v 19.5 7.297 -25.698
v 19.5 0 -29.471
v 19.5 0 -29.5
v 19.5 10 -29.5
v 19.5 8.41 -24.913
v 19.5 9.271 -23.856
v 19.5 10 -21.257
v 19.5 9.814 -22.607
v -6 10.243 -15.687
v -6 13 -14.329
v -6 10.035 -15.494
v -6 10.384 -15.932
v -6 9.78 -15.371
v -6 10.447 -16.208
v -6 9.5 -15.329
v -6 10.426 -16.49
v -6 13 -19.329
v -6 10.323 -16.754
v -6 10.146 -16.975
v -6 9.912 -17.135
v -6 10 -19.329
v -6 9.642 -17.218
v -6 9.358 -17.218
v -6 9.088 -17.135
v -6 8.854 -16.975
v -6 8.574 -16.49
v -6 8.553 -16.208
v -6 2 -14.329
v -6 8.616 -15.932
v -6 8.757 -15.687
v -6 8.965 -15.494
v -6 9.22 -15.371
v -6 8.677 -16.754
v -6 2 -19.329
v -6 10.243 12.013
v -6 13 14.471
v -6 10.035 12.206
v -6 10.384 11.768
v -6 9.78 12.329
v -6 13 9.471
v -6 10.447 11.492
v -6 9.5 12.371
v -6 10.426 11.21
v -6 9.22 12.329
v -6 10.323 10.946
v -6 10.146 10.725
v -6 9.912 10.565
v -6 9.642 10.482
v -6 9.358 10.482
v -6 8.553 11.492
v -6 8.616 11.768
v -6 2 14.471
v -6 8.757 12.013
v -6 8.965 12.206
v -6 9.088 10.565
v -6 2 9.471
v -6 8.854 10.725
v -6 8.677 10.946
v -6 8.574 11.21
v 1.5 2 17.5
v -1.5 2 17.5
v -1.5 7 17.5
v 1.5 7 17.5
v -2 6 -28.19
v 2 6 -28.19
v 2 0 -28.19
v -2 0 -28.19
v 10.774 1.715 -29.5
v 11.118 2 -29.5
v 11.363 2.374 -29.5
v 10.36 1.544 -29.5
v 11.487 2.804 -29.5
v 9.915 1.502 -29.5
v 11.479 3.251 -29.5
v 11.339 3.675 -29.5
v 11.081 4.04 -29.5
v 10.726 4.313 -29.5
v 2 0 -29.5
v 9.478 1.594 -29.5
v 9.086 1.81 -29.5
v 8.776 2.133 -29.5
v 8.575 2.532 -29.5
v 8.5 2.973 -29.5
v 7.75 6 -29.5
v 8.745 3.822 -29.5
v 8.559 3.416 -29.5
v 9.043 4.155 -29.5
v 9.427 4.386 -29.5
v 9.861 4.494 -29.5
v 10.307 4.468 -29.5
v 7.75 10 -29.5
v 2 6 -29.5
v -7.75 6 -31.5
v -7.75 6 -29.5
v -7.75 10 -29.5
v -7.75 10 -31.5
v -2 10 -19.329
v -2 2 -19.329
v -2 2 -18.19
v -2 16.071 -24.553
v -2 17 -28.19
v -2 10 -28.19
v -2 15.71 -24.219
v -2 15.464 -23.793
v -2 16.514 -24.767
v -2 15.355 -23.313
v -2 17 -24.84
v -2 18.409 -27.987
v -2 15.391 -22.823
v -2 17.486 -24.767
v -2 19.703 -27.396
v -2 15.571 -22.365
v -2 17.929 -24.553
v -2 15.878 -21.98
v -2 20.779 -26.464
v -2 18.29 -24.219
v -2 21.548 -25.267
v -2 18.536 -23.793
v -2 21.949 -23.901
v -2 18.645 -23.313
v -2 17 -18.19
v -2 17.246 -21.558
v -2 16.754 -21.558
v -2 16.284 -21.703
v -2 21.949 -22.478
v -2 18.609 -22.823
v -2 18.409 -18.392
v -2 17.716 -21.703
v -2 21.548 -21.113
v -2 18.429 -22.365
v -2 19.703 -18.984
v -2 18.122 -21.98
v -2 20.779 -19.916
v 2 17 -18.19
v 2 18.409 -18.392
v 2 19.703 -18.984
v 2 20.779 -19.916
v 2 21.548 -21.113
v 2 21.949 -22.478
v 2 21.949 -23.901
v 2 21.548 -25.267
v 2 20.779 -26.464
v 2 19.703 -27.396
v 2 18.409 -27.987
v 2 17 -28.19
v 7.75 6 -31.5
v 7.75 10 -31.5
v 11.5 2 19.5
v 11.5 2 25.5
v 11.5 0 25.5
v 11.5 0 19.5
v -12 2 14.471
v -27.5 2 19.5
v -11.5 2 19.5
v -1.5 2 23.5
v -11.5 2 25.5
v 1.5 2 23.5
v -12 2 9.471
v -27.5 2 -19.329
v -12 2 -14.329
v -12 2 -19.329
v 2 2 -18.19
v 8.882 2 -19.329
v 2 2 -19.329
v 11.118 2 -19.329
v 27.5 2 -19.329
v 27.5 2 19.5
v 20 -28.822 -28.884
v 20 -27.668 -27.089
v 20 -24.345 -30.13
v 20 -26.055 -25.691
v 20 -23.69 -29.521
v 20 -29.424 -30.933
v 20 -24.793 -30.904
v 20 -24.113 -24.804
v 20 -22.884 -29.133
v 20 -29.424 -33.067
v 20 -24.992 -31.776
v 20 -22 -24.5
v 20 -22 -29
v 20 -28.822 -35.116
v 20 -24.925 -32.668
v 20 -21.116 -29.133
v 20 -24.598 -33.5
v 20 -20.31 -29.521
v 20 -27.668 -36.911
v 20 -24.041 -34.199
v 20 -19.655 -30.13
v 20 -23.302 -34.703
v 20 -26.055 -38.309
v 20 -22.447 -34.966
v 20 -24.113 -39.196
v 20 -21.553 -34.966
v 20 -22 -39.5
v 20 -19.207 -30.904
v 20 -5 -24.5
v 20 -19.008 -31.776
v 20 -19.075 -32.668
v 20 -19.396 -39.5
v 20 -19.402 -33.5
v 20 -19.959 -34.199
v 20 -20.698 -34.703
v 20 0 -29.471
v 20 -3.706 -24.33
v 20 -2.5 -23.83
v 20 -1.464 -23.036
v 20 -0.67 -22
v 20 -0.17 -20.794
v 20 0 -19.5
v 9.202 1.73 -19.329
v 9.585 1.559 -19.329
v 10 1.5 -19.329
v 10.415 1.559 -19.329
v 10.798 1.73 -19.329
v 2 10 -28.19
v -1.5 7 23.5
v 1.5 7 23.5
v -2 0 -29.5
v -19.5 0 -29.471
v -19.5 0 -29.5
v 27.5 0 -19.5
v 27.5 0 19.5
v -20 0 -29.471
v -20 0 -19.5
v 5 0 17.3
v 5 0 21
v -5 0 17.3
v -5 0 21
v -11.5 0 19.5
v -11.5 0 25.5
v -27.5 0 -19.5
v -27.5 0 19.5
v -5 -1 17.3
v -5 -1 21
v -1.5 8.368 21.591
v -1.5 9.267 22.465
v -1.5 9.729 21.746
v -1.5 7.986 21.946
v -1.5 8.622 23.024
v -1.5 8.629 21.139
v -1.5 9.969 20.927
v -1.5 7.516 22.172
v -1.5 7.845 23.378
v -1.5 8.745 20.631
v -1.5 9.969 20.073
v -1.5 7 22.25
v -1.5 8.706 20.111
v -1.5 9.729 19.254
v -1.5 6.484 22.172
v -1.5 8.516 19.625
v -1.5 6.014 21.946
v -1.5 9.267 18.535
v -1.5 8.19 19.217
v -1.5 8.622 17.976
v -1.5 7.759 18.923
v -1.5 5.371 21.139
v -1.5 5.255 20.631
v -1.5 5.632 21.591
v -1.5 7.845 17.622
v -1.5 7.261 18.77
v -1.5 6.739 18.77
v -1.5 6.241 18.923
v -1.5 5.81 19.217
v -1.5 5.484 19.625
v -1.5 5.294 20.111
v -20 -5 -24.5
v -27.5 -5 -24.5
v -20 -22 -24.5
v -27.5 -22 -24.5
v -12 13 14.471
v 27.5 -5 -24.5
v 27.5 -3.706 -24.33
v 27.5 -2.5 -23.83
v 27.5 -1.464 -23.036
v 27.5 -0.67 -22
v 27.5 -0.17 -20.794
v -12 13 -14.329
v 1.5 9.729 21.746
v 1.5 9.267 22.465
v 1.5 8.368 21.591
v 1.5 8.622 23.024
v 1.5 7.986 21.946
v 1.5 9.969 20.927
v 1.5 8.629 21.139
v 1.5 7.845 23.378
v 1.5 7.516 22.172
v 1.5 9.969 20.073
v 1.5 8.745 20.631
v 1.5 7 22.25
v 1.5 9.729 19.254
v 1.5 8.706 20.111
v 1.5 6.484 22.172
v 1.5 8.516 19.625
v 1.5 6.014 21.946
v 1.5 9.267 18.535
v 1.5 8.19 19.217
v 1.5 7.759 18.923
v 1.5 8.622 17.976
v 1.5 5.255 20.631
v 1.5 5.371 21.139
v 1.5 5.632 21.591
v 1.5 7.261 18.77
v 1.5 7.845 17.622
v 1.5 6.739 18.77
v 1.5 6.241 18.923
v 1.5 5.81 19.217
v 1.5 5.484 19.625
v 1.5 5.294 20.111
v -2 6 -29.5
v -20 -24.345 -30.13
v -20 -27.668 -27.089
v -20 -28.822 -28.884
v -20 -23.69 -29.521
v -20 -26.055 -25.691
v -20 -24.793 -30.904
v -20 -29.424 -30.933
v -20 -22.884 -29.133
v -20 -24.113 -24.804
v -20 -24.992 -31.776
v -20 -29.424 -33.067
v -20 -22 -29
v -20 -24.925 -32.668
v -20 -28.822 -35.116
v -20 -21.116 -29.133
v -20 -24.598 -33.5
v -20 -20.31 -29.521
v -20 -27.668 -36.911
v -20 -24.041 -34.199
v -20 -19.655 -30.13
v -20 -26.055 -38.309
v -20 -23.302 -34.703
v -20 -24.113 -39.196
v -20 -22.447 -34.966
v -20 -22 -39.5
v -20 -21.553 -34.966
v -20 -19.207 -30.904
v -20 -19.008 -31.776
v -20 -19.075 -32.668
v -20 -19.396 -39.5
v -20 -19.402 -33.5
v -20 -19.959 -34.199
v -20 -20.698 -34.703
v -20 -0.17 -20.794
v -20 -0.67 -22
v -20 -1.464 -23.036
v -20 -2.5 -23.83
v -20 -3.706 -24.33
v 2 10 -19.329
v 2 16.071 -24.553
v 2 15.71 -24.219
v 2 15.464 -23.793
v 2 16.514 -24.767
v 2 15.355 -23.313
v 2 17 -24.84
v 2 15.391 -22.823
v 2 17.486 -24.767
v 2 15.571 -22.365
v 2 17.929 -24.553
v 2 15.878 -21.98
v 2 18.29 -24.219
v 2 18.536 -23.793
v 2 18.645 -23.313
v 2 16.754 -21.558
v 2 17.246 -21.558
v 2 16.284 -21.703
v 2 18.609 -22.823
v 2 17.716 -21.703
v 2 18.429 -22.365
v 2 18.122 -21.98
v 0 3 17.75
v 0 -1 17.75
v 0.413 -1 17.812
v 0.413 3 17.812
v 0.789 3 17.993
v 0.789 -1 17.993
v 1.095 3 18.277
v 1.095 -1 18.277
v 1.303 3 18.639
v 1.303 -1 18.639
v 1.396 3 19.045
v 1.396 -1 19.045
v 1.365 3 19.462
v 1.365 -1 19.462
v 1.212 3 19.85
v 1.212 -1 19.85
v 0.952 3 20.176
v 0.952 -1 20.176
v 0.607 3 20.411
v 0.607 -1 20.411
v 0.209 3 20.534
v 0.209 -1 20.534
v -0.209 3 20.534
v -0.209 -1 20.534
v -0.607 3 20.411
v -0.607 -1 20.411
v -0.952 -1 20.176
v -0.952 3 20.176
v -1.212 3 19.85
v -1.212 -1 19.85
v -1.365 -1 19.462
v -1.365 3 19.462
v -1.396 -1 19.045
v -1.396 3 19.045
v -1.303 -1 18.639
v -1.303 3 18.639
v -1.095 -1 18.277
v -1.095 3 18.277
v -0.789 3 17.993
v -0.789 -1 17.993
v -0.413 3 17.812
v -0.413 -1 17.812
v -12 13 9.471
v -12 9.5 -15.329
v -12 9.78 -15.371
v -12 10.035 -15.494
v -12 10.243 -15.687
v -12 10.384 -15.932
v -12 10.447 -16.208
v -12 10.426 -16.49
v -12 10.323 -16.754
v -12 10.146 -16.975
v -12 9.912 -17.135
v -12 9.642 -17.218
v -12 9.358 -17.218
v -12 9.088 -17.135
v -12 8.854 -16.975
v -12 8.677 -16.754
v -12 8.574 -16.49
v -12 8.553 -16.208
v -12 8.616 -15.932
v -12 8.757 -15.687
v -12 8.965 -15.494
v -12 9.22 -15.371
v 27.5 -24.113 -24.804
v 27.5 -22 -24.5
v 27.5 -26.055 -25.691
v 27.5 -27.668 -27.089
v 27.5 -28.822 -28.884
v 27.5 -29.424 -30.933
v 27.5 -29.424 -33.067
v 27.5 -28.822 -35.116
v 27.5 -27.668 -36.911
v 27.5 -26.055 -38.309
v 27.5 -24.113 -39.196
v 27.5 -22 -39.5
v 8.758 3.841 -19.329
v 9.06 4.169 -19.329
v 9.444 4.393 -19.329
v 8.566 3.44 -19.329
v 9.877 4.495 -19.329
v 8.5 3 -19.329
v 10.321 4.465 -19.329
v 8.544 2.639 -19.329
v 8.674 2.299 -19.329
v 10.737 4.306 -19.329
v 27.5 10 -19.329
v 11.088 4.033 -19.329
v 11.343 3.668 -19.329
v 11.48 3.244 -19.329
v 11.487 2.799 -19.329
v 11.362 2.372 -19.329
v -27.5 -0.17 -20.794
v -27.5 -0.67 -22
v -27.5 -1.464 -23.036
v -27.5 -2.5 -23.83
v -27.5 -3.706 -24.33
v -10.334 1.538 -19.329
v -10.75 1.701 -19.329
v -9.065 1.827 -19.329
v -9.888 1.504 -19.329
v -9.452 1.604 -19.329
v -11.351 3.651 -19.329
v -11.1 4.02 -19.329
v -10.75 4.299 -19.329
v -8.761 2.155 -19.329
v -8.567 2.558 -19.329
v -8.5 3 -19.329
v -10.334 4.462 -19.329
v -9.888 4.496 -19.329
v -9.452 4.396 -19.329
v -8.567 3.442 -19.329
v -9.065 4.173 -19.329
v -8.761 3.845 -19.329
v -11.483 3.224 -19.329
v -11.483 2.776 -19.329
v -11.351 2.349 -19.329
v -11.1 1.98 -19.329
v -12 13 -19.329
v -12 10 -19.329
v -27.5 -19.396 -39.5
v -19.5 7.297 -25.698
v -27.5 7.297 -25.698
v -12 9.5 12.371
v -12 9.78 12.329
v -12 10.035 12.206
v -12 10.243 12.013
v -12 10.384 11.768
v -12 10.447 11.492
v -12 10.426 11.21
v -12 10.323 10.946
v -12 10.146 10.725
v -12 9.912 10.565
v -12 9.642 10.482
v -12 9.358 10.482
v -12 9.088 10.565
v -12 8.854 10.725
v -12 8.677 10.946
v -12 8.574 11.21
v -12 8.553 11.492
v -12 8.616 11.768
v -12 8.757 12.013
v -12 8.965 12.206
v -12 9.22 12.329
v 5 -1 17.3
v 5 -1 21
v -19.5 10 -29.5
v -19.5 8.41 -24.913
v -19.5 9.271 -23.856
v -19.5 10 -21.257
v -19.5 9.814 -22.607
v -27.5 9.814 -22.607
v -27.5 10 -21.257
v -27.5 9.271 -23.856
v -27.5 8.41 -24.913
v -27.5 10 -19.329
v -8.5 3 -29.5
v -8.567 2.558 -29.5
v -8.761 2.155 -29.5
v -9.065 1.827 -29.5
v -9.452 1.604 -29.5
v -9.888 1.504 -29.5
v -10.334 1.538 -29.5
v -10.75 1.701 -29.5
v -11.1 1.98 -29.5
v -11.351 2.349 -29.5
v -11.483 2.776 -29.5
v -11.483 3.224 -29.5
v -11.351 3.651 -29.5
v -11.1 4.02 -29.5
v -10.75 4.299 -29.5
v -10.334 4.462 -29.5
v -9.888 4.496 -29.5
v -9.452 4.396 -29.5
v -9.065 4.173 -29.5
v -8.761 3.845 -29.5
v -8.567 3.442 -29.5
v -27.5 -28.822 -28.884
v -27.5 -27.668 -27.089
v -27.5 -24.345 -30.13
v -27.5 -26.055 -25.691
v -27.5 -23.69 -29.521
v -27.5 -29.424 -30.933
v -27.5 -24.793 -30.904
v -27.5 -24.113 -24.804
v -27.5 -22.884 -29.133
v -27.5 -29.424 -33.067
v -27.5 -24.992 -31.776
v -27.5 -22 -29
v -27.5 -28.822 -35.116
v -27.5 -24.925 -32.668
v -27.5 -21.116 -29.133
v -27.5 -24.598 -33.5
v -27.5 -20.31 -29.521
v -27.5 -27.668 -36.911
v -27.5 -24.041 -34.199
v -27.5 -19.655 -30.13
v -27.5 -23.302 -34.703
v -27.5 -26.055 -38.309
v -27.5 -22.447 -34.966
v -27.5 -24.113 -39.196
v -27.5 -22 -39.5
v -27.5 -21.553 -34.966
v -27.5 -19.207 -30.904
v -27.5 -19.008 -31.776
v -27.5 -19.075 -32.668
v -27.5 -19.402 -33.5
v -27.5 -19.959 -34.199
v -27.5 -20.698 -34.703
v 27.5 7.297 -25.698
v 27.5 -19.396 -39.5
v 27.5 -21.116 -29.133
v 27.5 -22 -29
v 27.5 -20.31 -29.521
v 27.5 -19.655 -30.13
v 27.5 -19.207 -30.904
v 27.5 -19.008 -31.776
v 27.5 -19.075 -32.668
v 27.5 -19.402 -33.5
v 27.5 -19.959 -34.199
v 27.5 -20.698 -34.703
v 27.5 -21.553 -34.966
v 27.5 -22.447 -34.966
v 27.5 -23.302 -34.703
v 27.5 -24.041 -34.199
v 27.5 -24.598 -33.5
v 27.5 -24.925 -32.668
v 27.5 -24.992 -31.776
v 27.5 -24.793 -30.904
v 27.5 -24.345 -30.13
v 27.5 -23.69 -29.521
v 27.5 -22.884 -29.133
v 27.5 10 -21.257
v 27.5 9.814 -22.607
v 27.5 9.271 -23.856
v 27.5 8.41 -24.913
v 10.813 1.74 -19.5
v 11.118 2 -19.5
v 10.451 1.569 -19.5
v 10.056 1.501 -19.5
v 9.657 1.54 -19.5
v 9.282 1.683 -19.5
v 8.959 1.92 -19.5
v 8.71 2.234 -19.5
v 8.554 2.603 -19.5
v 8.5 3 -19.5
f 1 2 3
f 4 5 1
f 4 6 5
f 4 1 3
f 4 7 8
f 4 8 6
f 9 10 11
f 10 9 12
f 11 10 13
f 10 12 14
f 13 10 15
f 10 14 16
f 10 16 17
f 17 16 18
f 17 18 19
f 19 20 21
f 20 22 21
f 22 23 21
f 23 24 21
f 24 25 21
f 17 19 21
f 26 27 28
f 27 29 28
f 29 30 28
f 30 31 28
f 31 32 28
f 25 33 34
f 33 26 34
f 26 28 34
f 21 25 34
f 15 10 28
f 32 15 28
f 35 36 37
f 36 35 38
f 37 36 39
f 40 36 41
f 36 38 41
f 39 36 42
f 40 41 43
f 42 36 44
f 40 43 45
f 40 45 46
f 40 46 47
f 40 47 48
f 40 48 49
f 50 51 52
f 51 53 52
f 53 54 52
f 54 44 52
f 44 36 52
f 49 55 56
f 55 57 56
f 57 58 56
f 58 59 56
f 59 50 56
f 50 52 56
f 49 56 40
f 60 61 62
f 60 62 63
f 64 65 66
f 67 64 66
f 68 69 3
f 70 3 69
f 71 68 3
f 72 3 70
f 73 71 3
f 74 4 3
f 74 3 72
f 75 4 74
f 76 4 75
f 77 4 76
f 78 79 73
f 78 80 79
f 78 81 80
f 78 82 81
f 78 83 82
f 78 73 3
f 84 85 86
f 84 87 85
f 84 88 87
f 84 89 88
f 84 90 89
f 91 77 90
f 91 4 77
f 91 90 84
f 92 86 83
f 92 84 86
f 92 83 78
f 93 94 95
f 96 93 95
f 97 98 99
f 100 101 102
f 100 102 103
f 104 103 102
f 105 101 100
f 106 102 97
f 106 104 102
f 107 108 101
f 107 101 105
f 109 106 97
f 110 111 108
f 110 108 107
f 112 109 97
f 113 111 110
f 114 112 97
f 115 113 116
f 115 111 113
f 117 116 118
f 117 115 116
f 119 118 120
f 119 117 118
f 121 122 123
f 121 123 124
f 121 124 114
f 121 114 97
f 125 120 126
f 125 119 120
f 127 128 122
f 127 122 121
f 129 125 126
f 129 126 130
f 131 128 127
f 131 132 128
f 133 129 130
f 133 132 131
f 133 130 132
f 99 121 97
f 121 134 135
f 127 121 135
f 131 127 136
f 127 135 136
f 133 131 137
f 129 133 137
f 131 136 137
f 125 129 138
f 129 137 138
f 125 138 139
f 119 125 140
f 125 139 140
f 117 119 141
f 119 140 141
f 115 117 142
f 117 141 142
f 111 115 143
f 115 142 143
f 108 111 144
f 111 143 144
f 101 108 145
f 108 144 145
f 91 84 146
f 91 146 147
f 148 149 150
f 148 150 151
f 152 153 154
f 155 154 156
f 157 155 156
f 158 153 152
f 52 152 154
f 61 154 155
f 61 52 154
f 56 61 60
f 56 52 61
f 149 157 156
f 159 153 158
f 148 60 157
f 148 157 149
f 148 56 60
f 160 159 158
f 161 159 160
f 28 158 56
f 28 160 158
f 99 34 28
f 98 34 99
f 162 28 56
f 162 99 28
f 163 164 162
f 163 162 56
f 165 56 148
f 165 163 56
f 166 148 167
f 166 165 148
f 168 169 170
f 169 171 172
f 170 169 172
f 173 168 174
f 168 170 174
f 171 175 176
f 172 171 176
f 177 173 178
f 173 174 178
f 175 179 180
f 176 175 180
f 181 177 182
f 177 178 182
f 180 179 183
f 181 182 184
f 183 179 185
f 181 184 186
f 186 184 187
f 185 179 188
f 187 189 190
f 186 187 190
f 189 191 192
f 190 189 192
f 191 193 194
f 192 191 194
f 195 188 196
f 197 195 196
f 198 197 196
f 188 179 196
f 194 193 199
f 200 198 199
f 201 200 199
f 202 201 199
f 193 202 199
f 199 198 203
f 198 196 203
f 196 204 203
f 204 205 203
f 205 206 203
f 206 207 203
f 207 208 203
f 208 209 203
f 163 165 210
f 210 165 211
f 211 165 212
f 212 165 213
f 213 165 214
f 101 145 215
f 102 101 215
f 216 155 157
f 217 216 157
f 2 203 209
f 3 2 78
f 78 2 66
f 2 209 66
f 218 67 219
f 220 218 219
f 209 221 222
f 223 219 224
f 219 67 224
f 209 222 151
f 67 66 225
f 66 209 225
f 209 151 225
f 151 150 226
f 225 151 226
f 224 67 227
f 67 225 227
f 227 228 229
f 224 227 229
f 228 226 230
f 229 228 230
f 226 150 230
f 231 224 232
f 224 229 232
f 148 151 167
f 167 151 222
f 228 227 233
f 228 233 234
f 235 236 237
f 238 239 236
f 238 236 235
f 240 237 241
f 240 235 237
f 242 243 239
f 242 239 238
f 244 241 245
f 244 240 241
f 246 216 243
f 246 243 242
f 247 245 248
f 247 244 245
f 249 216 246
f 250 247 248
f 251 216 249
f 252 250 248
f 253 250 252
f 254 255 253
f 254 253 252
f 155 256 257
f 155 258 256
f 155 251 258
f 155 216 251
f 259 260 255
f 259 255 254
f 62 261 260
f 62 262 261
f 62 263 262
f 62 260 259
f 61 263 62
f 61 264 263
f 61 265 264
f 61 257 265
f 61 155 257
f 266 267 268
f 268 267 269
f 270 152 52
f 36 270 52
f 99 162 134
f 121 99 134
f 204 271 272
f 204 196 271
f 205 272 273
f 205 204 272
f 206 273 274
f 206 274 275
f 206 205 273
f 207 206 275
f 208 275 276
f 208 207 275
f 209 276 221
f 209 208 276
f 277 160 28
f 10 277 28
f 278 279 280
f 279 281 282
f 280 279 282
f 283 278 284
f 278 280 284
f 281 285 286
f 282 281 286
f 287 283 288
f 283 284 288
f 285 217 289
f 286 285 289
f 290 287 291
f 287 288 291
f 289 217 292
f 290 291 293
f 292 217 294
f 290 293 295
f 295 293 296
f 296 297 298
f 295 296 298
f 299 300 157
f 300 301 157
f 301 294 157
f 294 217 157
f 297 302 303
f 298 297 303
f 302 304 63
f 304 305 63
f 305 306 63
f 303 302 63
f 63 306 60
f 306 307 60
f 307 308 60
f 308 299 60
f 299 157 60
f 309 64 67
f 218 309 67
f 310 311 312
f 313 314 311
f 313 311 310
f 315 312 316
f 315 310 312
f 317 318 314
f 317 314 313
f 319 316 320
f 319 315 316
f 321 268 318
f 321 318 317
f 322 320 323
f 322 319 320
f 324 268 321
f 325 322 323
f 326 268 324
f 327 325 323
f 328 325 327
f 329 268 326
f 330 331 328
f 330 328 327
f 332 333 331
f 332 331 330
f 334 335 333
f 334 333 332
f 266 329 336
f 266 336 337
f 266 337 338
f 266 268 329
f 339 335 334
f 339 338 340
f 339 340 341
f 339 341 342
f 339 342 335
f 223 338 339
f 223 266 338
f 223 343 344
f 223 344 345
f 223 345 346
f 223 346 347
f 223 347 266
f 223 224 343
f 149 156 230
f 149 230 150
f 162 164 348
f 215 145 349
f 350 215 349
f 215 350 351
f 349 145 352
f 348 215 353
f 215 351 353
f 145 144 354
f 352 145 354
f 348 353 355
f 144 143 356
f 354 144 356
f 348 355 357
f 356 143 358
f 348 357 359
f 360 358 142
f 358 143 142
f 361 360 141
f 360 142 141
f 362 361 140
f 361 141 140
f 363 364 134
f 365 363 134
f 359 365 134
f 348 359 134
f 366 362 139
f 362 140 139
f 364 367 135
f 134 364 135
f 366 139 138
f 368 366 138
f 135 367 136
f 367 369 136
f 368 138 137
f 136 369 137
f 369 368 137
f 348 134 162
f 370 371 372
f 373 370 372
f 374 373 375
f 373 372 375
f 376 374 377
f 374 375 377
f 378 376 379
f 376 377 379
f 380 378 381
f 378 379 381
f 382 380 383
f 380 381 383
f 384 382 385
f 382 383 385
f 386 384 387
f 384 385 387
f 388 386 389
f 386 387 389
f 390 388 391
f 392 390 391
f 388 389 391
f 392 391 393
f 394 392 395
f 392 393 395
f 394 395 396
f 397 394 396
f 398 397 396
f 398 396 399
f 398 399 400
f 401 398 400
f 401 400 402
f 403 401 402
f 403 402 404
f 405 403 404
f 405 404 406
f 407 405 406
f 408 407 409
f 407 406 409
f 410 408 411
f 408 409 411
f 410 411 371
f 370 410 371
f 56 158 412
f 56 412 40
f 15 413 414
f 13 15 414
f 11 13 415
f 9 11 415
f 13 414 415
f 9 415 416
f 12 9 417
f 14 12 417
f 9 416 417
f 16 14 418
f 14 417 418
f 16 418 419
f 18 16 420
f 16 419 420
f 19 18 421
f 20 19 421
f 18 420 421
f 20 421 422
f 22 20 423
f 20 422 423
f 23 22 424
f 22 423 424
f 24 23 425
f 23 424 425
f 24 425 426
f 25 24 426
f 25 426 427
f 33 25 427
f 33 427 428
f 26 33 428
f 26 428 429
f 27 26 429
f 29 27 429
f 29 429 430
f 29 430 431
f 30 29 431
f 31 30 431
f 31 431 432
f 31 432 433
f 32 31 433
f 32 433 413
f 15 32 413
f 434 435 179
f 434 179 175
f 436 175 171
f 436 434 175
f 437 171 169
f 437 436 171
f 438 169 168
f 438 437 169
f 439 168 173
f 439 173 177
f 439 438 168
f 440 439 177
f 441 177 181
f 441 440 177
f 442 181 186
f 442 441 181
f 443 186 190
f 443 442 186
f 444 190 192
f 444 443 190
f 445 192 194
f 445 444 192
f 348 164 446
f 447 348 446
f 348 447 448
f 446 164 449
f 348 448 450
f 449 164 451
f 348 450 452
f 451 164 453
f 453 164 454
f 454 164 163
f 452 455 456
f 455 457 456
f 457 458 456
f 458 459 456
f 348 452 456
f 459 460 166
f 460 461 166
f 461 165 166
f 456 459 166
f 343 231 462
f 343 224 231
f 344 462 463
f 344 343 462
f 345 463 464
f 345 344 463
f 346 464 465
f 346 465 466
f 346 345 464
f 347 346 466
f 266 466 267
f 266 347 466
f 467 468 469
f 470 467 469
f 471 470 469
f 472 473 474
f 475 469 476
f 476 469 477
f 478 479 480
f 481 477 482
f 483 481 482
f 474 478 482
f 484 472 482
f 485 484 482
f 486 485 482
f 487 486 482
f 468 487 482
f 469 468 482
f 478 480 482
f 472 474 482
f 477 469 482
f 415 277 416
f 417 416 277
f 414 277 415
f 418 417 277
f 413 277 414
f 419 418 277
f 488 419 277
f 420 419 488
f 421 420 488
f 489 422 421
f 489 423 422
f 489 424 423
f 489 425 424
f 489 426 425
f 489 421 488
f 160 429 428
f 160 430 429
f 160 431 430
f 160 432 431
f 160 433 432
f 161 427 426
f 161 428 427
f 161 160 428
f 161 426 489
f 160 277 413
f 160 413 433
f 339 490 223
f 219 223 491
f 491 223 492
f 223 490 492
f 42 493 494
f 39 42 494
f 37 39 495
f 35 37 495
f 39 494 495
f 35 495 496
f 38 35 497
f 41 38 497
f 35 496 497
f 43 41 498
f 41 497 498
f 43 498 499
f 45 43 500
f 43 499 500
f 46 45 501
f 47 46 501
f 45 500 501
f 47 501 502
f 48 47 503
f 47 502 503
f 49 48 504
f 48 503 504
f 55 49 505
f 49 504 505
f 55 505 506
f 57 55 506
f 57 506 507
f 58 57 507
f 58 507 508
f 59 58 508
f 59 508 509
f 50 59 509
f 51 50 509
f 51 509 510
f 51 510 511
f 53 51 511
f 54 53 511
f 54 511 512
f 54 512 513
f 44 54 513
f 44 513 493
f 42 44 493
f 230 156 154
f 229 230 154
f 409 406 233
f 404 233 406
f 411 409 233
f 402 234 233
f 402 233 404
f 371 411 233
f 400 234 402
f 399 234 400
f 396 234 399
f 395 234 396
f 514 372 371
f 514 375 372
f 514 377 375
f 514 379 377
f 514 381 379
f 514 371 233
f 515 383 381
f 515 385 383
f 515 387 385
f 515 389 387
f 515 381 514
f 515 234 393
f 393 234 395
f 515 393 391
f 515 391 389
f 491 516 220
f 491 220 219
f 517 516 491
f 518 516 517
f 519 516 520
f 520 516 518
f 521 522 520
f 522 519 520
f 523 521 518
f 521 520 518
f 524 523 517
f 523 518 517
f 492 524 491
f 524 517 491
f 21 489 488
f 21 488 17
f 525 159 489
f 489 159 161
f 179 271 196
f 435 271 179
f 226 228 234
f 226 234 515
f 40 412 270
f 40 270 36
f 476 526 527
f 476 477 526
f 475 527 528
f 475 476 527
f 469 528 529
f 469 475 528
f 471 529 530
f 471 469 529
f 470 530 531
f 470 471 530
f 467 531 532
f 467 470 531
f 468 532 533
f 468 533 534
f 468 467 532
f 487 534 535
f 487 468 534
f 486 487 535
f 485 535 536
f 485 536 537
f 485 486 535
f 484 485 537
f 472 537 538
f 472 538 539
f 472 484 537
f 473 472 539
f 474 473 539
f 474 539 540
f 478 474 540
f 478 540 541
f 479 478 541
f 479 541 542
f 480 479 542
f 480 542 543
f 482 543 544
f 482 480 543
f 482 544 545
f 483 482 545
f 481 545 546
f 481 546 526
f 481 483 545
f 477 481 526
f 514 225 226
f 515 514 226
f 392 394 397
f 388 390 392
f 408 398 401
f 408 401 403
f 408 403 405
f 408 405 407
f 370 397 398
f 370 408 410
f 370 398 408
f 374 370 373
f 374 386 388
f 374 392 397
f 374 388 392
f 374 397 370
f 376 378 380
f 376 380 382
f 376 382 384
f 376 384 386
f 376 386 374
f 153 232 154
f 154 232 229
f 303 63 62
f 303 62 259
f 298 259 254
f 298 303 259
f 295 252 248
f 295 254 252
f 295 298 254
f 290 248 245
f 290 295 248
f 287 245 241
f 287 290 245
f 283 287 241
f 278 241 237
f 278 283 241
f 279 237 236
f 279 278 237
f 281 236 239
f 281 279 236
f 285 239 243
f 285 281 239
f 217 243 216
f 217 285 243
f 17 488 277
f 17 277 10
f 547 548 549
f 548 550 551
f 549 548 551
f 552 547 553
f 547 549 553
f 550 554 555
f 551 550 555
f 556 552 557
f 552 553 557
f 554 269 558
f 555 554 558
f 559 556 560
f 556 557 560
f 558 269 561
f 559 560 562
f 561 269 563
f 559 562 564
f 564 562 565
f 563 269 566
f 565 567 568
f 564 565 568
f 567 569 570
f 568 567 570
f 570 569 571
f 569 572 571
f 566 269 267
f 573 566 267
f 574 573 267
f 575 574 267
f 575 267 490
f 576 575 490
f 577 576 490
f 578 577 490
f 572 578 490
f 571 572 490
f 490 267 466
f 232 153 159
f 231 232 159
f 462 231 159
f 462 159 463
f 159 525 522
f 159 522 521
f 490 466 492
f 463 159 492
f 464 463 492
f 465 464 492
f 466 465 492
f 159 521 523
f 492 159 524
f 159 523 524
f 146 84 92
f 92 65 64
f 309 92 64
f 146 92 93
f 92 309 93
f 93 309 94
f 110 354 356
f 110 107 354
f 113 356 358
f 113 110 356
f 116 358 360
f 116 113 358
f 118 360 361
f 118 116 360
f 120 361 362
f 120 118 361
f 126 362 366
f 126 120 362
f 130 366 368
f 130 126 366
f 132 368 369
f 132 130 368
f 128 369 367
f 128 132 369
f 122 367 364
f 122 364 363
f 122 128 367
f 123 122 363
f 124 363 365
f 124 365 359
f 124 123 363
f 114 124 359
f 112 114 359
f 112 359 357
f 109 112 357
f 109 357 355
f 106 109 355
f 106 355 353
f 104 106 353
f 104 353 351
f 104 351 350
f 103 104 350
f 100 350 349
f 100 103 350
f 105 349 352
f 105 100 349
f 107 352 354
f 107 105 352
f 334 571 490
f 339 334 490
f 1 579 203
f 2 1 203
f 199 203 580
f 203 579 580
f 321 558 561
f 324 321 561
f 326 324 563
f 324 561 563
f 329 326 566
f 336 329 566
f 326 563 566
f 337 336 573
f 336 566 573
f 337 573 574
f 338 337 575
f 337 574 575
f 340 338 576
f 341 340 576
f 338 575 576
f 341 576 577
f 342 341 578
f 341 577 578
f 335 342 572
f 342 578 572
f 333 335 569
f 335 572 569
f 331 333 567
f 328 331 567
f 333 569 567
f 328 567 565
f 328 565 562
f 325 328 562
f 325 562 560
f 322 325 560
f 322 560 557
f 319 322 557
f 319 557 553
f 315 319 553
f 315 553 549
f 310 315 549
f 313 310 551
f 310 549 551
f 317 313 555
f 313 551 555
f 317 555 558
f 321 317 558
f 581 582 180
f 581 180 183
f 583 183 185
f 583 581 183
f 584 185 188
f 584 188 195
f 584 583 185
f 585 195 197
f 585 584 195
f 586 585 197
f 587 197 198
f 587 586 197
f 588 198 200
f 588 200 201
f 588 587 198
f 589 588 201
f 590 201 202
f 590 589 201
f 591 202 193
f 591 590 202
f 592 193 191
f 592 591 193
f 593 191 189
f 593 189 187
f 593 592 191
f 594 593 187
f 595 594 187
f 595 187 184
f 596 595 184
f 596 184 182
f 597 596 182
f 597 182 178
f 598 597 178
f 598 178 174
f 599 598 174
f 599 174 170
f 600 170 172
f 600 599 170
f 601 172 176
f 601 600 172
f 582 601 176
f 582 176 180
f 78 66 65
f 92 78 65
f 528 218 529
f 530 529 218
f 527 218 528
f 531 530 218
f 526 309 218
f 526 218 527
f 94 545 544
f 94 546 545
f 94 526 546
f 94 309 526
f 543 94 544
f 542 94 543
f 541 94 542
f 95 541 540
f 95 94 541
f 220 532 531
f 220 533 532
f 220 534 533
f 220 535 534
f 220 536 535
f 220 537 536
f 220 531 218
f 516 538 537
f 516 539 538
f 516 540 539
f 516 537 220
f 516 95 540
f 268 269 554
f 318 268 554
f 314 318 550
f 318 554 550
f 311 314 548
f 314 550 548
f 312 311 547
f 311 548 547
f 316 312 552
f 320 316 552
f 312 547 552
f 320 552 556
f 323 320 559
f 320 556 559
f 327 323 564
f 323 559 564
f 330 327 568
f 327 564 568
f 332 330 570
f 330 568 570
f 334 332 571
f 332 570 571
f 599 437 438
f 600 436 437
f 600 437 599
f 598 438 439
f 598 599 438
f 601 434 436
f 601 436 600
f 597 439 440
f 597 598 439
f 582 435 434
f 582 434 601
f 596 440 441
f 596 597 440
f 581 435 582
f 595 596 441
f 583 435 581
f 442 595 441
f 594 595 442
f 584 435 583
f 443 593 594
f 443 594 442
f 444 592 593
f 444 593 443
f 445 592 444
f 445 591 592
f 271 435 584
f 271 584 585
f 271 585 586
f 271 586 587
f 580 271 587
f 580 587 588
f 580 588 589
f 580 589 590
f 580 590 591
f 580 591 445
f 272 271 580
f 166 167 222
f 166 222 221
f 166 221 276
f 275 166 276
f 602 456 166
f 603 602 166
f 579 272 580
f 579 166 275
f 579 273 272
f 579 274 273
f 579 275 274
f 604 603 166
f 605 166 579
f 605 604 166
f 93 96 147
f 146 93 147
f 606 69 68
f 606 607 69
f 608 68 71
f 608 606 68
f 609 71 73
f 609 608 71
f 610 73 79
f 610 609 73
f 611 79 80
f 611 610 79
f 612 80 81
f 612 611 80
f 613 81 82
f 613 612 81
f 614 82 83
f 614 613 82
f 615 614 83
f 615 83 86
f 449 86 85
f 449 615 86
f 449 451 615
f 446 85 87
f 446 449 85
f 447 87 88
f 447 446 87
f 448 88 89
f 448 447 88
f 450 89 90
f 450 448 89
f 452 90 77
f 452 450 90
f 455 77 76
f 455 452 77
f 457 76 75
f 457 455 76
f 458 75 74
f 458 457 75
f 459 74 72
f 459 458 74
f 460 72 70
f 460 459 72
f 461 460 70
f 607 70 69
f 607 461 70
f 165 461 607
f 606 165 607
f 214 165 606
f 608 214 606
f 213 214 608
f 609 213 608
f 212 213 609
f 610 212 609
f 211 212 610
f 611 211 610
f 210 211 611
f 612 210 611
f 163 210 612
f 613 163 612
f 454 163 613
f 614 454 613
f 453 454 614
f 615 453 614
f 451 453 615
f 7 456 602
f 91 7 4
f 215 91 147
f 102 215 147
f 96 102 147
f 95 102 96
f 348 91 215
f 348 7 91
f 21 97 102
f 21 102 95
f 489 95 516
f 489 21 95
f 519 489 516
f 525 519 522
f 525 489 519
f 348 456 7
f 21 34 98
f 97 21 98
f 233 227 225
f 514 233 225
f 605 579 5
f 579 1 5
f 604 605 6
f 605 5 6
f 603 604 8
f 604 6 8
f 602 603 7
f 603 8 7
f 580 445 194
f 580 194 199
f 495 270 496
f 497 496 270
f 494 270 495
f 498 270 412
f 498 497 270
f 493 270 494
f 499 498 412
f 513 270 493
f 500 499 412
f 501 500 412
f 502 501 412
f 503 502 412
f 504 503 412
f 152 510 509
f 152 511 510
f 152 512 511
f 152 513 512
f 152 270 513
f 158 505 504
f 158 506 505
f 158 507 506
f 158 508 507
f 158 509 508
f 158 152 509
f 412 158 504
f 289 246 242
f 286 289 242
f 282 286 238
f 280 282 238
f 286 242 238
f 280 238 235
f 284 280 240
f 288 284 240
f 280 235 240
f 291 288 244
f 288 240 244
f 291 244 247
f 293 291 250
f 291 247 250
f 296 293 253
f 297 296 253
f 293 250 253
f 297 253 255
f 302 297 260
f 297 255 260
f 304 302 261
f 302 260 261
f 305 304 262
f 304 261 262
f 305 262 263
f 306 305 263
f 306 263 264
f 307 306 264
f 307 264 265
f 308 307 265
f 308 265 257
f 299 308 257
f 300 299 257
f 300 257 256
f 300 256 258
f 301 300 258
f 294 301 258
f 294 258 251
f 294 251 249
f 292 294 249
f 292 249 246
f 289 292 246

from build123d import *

# Parameters (mm, degrees)
SKETCH_1_W           = 55
SKETCH_1_H           = 39
EXTRUDE_1_DEPTH      = 2
SKETCH_2_W           = 23
SKETCH_2_H           = 6
EXTRUDE_2_DEPTH      = 2
SKETCH_3_W           = 6
SKETCH_3_H           = 5
EXTRUDE_3_DEPTH      = 11
SKETCH_5_R           = 0.95
CUT_EXTRUDE_1_DEPTH  = 11
SKETCH_6_W           = 55
SKETCH_6_H           = 0.171008225
EXTRUDE_4_DEPTH      = 8
SKETCH_8_R           = 1.65
EXTRUDE_6_DEPTH      = 2
SKETCH_10_W          = 3
SKETCH_10_H          = 6
EXTRUDE_7_DEPTH      = 8
SKETCH_11_R          = 1.5
CUT_EXTRUDE_3_DEPTH  = 13
SKETCH_12_R          = 3
EXTRUDE_8_DEPTH      = 7.5
SKETCH_13_W          = 10
SKETCH_13_H          = 3.7
EXTRUDE_9_DEPTH      = 1
FILLET_3_RADIUS      = 3
FILLET_3_LENGTH      = 3
SKETCH_15_R          = 1.75
CUT_EXTRUDE_5_DEPTH  = 23
SKETCH_16_W          = 15.5
SKETCH_16_H          = 4
EXTRUDE_10_DEPTH     = 20
SKETCH_17_R          = 1.5
EXTRUDE_11_DEPTH     = 10
FILLET_4_R           = 10
SKETCH_18_W          = 26.564734734
SKETCH_18_H          = 10.454508508
CUT_EXTRUDE_6_DEPTH  = 10
CUT_EXTRUDE_7_DEPTH  = 8
CUT_EXTRUDE_8_DEPTH  = 8
FILLET_6_R           = 5
SKETCH_22_R          = 1.4
CUT_EXTRUDE_10_DEPTH = 4


with BuildPart() as part:
    # 草图1 → 凸台-拉伸1 (new body)
    with BuildSketch(Plane(origin=(0, 0, 0), x_dir=(1, 0, 0), z_dir=(0, 1, 0))):
        Rectangle(SKETCH_1_W, SKETCH_1_H)
    extrude(amount=EXTRUDE_1_DEPTH)

    # 草图2 → 凸台-拉伸2 (add)
    with BuildSketch(Plane(origin=(0, 2, 0), x_dir=(1, 0, 0), z_dir=(0, 1, 0))):
        with Locations((0, -22.5)):
            Rectangle(SKETCH_2_W, SKETCH_2_H)
    extrude(amount=-EXTRUDE_2_DEPTH)

    # 草图3 → 凸台-拉伸3 (add)
    with BuildSketch(Plane(origin=(0, 2, 0), x_dir=(1, 0, 0), z_dir=(0, 1, 0))):
        with Locations((-9, -11.971008225)):
            Rectangle(SKETCH_3_W, SKETCH_3_H)
        with Locations((-9, 16.828991775)):
            Rectangle(SKETCH_3_W, SKETCH_3_H)
    extrude(amount=EXTRUDE_3_DEPTH)

    # 草图5 → 切除-拉伸1 (cut)
    with BuildSketch(Plane.ZY.offset(12)):
        with Locations((-16.278991775, 9.5)):
            Circle(SKETCH_5_R)
        with Locations((11.421008225, 9.5)):
            Circle(SKETCH_5_R)
    extrude(amount=-CUT_EXTRUDE_1_DEPTH, mode=Mode.SUBTRACT)

    # 草图6 → 凸台-拉伸4 (add)
    with BuildSketch(Plane(origin=(0, 2, 0), x_dir=(1, 0, 0), z_dir=(0, 1, 0))):
        with Locations((0, 19.414495888)):
            Rectangle(SKETCH_6_W, SKETCH_6_H)
    extrude(amount=EXTRUDE_4_DEPTH)

    # 草图8 → 凸台-拉伸6 (add, symmetric)
    with BuildSketch(Plane(origin=(0, 0, 0), x_dir=(0, 0, -1), z_dir=(1, 0, 0))):
        with BuildLine():
            Line((28.189872998, 17), (28.189872998, 0))
            Line((28.189872998, 0), (18.189872998, 0))
            Line((18.189872998, 0), (18.189872998, 17))
            ThreePointArc((18.189872998, 17), (23.189872998, 22), (28.189872998, 17))
        make_face()
        with Locations((23.189872998, 17)):
            Circle(SKETCH_8_R, mode=Mode.SUBTRACT)
    extrude(amount=EXTRUDE_6_DEPTH, both=True)

    # 草图10 → 凸台-拉伸7 (add)
    with BuildSketch(Plane(origin=(0, 2, 0), x_dir=(1, 0, 0), z_dir=(0, 1, 0))):
        with Locations((0, -20.5)):
            Rectangle(SKETCH_10_W, SKETCH_10_H)
    extrude(amount=EXTRUDE_7_DEPTH)

    # 草图11 → 切除-拉伸3 (cut)
    with BuildSketch(Plane.XY.offset(-19.328991775)):
        with Locations((-10, 3)):
            Circle(SKETCH_11_R)
    cut_extrude_3 = extrude(amount=-CUT_EXTRUDE_3_DEPTH, mode=Mode.SUBTRACT)

    # 草图12 → 凸台-拉伸8 (add)
    with BuildSketch(Plane.ZY.offset(27.5)):
        with BuildLine():
            Line((-39.5, -22), (-39.5, 10))
            Line((-39.5, 10), (-19.5, 10))
            Line((-19.5, 10), (-19.5, 0))
            Line((-19.5, 0), (-24.5, 0))
            Line((-24.5, 0), (-24.5, -22))
            ThreePointArc((-24.5, -22), (-32, -29.5), (-39.5, -22))
        make_face()
        with Locations((-32, -22)):
            Circle(SKETCH_12_R, mode=Mode.SUBTRACT)
    extrude_8 = extrude(amount=-EXTRUDE_8_DEPTH)

    # 草图13 → 凸台-拉伸9 (add)
    with BuildSketch(Plane.XZ):
        with Locations((0, 19.15)):
            Rectangle(SKETCH_13_W, SKETCH_13_H)
    extrude(amount=EXTRUDE_9_DEPTH)

    # 镜向1: 切除-拉伸3, 凸台-拉伸8 across plane
    add(cut_extrude_3.mirror(Plane(origin=(0, 0, 0), x_dir=(0, 0, 1), z_dir=(1, 0, 0))), mode=Mode.SUBTRACT)
    add(extrude_8.mirror(Plane(origin=(0, 0, 0), x_dir=(0, 0, 1), z_dir=(1, 0, 0))))

    # 圆角3: full round fillet: the end face becomes a half cylinder, R = half its width
    fillet_3_face = Plane((0, 10, 20.5), x_dir=(1, 0, 0), z_dir=(0, 1, 0))  # on the end face: x along it, z out of the body
    fillet_3_slab = fillet_3_face.offset(-FILLET_3_RADIUS / 2) * Box(FILLET_3_LENGTH, 2 * FILLET_3_RADIUS, FILLET_3_RADIUS, mode=Mode.PRIVATE)  # the body's end, R deep
    fillet_3_round = Plane((0, 7, 20.5), x_dir=(0, 1, 0), z_dir=(1, 0, 0)) * Cylinder(FILLET_3_RADIUS, FILLET_3_LENGTH, mode=Mode.PRIVATE)  # its axis R under the face
    add(fillet_3_slab - fillet_3_round, mode=Mode.SUBTRACT)

    # 草图15 → 切除-拉伸5 (cut)
    with BuildSketch(Plane.ZY.offset(1.5)):
        with Locations((20.5, 7)):
            Circle(SKETCH_15_R)
    extrude(amount=-CUT_EXTRUDE_5_DEPTH, mode=Mode.SUBTRACT)

    # 草图16 → 凸台-拉伸10 (add)
    with BuildSketch(Plane(origin=(0, 0, -19.5), x_dir=(-1, 0, 0), z_dir=(0, 0, -1))):
        with Locations((0, 8)):
            Rectangle(SKETCH_16_W, SKETCH_16_H)
    extrude(amount=EXTRUDE_10_DEPTH)

    # 草图17 → 凸台-拉伸11 (add)
    # profile 1 of 2: a face of its own
    with BuildSketch(Plane(origin=(0, 0, -19.5), x_dir=(-1, 0, 0), z_dir=(0, 0, -1))):
        Polygon((-20, 0), (-2, 0), (-2, 6), (-7.75, 6), (-7.75, 10), (-20, 10), align=None)
        with Locations(Location((-10, 3, 0), (0, 0, 221.810314896))):
            Circle(SKETCH_17_R, mode=Mode.SUBTRACT)
    # profile 2 of 2: a face of its own
    with BuildSketch(Plane(origin=(0, 0, -19.5), x_dir=(-1, 0, 0), z_dir=(0, 0, -1))):
        Polygon((7.75, 6), (2, 6), (2, 0), (20, 0), (20, 10), (7.75, 10), align=None)
        with Locations(Location((10, 3, 0), (0, 0, 180))):
            Circle(SKETCH_17_R, mode=Mode.SUBTRACT)
    extrude(amount=EXTRUDE_11_DEPTH)

    # 圆角4
    fillet_4_edges = [part.edges().sort_by_distance(p)[0] for p in [
        (23.75, 10, -39.5),
        (-23.75, 10, -39.5),
    ]]
    fillet(fillet_4_edges, radius=FILLET_4_R)

    # 草图18 → 切除-拉伸6 (cut)
    with BuildSketch(Plane(origin=(0, 10, 0), x_dir=(1, 0, 0), z_dir=(0, 1, 0))):
        with Locations((-0.840887807, 36.727254254)):
            Rectangle(SKETCH_18_W, SKETCH_18_H)
    extrude(amount=-CUT_EXTRUDE_6_DEPTH, mode=Mode.SUBTRACT)

    # 草图19 → 切除-拉伸7 (cut)
    with BuildSketch(Plane(origin=(27.5, 0, 0), x_dir=(0, 0, -1), z_dir=(1, 0, 0))):
        Polygon((24.3, 10), (39.5, -19.395601839), (39.5, 10), align=None)
    extrude(amount=-CUT_EXTRUDE_7_DEPTH, mode=Mode.SUBTRACT)

    # 草图20 → 切除-拉伸8 (cut)
    with BuildSketch(Plane.ZY.offset(27.5)):
        Polygon((-24.3, 10), (-39.5, 10), (-39.5, -19.395601839), align=None)
    extrude(amount=-CUT_EXTRUDE_8_DEPTH, mode=Mode.SUBTRACT)

    # 圆角6
    fillet_6_edges = [part.edges().sort_by_distance(p)[0] for p in [
        (-23.75, 0, -24.5),
        (23.75, 0, -24.5),
        (23.5, 10, -24.3),
        (-23.5, 10, -24.3),
    ]]
    fillet(fillet_6_edges, radius=FILLET_6_R)

    # 草图22 → 切除-拉伸10 (cut)
    with BuildSketch(Plane.XZ.offset(1)):
        with Locations(Location((0, 19.15, 0), (0, 0, 270))):
            Circle(SKETCH_22_R)
    extrude(amount=-CUT_EXTRUDE_10_DEPTH, mode=Mode.SUBTRACT)


solid = part.part
